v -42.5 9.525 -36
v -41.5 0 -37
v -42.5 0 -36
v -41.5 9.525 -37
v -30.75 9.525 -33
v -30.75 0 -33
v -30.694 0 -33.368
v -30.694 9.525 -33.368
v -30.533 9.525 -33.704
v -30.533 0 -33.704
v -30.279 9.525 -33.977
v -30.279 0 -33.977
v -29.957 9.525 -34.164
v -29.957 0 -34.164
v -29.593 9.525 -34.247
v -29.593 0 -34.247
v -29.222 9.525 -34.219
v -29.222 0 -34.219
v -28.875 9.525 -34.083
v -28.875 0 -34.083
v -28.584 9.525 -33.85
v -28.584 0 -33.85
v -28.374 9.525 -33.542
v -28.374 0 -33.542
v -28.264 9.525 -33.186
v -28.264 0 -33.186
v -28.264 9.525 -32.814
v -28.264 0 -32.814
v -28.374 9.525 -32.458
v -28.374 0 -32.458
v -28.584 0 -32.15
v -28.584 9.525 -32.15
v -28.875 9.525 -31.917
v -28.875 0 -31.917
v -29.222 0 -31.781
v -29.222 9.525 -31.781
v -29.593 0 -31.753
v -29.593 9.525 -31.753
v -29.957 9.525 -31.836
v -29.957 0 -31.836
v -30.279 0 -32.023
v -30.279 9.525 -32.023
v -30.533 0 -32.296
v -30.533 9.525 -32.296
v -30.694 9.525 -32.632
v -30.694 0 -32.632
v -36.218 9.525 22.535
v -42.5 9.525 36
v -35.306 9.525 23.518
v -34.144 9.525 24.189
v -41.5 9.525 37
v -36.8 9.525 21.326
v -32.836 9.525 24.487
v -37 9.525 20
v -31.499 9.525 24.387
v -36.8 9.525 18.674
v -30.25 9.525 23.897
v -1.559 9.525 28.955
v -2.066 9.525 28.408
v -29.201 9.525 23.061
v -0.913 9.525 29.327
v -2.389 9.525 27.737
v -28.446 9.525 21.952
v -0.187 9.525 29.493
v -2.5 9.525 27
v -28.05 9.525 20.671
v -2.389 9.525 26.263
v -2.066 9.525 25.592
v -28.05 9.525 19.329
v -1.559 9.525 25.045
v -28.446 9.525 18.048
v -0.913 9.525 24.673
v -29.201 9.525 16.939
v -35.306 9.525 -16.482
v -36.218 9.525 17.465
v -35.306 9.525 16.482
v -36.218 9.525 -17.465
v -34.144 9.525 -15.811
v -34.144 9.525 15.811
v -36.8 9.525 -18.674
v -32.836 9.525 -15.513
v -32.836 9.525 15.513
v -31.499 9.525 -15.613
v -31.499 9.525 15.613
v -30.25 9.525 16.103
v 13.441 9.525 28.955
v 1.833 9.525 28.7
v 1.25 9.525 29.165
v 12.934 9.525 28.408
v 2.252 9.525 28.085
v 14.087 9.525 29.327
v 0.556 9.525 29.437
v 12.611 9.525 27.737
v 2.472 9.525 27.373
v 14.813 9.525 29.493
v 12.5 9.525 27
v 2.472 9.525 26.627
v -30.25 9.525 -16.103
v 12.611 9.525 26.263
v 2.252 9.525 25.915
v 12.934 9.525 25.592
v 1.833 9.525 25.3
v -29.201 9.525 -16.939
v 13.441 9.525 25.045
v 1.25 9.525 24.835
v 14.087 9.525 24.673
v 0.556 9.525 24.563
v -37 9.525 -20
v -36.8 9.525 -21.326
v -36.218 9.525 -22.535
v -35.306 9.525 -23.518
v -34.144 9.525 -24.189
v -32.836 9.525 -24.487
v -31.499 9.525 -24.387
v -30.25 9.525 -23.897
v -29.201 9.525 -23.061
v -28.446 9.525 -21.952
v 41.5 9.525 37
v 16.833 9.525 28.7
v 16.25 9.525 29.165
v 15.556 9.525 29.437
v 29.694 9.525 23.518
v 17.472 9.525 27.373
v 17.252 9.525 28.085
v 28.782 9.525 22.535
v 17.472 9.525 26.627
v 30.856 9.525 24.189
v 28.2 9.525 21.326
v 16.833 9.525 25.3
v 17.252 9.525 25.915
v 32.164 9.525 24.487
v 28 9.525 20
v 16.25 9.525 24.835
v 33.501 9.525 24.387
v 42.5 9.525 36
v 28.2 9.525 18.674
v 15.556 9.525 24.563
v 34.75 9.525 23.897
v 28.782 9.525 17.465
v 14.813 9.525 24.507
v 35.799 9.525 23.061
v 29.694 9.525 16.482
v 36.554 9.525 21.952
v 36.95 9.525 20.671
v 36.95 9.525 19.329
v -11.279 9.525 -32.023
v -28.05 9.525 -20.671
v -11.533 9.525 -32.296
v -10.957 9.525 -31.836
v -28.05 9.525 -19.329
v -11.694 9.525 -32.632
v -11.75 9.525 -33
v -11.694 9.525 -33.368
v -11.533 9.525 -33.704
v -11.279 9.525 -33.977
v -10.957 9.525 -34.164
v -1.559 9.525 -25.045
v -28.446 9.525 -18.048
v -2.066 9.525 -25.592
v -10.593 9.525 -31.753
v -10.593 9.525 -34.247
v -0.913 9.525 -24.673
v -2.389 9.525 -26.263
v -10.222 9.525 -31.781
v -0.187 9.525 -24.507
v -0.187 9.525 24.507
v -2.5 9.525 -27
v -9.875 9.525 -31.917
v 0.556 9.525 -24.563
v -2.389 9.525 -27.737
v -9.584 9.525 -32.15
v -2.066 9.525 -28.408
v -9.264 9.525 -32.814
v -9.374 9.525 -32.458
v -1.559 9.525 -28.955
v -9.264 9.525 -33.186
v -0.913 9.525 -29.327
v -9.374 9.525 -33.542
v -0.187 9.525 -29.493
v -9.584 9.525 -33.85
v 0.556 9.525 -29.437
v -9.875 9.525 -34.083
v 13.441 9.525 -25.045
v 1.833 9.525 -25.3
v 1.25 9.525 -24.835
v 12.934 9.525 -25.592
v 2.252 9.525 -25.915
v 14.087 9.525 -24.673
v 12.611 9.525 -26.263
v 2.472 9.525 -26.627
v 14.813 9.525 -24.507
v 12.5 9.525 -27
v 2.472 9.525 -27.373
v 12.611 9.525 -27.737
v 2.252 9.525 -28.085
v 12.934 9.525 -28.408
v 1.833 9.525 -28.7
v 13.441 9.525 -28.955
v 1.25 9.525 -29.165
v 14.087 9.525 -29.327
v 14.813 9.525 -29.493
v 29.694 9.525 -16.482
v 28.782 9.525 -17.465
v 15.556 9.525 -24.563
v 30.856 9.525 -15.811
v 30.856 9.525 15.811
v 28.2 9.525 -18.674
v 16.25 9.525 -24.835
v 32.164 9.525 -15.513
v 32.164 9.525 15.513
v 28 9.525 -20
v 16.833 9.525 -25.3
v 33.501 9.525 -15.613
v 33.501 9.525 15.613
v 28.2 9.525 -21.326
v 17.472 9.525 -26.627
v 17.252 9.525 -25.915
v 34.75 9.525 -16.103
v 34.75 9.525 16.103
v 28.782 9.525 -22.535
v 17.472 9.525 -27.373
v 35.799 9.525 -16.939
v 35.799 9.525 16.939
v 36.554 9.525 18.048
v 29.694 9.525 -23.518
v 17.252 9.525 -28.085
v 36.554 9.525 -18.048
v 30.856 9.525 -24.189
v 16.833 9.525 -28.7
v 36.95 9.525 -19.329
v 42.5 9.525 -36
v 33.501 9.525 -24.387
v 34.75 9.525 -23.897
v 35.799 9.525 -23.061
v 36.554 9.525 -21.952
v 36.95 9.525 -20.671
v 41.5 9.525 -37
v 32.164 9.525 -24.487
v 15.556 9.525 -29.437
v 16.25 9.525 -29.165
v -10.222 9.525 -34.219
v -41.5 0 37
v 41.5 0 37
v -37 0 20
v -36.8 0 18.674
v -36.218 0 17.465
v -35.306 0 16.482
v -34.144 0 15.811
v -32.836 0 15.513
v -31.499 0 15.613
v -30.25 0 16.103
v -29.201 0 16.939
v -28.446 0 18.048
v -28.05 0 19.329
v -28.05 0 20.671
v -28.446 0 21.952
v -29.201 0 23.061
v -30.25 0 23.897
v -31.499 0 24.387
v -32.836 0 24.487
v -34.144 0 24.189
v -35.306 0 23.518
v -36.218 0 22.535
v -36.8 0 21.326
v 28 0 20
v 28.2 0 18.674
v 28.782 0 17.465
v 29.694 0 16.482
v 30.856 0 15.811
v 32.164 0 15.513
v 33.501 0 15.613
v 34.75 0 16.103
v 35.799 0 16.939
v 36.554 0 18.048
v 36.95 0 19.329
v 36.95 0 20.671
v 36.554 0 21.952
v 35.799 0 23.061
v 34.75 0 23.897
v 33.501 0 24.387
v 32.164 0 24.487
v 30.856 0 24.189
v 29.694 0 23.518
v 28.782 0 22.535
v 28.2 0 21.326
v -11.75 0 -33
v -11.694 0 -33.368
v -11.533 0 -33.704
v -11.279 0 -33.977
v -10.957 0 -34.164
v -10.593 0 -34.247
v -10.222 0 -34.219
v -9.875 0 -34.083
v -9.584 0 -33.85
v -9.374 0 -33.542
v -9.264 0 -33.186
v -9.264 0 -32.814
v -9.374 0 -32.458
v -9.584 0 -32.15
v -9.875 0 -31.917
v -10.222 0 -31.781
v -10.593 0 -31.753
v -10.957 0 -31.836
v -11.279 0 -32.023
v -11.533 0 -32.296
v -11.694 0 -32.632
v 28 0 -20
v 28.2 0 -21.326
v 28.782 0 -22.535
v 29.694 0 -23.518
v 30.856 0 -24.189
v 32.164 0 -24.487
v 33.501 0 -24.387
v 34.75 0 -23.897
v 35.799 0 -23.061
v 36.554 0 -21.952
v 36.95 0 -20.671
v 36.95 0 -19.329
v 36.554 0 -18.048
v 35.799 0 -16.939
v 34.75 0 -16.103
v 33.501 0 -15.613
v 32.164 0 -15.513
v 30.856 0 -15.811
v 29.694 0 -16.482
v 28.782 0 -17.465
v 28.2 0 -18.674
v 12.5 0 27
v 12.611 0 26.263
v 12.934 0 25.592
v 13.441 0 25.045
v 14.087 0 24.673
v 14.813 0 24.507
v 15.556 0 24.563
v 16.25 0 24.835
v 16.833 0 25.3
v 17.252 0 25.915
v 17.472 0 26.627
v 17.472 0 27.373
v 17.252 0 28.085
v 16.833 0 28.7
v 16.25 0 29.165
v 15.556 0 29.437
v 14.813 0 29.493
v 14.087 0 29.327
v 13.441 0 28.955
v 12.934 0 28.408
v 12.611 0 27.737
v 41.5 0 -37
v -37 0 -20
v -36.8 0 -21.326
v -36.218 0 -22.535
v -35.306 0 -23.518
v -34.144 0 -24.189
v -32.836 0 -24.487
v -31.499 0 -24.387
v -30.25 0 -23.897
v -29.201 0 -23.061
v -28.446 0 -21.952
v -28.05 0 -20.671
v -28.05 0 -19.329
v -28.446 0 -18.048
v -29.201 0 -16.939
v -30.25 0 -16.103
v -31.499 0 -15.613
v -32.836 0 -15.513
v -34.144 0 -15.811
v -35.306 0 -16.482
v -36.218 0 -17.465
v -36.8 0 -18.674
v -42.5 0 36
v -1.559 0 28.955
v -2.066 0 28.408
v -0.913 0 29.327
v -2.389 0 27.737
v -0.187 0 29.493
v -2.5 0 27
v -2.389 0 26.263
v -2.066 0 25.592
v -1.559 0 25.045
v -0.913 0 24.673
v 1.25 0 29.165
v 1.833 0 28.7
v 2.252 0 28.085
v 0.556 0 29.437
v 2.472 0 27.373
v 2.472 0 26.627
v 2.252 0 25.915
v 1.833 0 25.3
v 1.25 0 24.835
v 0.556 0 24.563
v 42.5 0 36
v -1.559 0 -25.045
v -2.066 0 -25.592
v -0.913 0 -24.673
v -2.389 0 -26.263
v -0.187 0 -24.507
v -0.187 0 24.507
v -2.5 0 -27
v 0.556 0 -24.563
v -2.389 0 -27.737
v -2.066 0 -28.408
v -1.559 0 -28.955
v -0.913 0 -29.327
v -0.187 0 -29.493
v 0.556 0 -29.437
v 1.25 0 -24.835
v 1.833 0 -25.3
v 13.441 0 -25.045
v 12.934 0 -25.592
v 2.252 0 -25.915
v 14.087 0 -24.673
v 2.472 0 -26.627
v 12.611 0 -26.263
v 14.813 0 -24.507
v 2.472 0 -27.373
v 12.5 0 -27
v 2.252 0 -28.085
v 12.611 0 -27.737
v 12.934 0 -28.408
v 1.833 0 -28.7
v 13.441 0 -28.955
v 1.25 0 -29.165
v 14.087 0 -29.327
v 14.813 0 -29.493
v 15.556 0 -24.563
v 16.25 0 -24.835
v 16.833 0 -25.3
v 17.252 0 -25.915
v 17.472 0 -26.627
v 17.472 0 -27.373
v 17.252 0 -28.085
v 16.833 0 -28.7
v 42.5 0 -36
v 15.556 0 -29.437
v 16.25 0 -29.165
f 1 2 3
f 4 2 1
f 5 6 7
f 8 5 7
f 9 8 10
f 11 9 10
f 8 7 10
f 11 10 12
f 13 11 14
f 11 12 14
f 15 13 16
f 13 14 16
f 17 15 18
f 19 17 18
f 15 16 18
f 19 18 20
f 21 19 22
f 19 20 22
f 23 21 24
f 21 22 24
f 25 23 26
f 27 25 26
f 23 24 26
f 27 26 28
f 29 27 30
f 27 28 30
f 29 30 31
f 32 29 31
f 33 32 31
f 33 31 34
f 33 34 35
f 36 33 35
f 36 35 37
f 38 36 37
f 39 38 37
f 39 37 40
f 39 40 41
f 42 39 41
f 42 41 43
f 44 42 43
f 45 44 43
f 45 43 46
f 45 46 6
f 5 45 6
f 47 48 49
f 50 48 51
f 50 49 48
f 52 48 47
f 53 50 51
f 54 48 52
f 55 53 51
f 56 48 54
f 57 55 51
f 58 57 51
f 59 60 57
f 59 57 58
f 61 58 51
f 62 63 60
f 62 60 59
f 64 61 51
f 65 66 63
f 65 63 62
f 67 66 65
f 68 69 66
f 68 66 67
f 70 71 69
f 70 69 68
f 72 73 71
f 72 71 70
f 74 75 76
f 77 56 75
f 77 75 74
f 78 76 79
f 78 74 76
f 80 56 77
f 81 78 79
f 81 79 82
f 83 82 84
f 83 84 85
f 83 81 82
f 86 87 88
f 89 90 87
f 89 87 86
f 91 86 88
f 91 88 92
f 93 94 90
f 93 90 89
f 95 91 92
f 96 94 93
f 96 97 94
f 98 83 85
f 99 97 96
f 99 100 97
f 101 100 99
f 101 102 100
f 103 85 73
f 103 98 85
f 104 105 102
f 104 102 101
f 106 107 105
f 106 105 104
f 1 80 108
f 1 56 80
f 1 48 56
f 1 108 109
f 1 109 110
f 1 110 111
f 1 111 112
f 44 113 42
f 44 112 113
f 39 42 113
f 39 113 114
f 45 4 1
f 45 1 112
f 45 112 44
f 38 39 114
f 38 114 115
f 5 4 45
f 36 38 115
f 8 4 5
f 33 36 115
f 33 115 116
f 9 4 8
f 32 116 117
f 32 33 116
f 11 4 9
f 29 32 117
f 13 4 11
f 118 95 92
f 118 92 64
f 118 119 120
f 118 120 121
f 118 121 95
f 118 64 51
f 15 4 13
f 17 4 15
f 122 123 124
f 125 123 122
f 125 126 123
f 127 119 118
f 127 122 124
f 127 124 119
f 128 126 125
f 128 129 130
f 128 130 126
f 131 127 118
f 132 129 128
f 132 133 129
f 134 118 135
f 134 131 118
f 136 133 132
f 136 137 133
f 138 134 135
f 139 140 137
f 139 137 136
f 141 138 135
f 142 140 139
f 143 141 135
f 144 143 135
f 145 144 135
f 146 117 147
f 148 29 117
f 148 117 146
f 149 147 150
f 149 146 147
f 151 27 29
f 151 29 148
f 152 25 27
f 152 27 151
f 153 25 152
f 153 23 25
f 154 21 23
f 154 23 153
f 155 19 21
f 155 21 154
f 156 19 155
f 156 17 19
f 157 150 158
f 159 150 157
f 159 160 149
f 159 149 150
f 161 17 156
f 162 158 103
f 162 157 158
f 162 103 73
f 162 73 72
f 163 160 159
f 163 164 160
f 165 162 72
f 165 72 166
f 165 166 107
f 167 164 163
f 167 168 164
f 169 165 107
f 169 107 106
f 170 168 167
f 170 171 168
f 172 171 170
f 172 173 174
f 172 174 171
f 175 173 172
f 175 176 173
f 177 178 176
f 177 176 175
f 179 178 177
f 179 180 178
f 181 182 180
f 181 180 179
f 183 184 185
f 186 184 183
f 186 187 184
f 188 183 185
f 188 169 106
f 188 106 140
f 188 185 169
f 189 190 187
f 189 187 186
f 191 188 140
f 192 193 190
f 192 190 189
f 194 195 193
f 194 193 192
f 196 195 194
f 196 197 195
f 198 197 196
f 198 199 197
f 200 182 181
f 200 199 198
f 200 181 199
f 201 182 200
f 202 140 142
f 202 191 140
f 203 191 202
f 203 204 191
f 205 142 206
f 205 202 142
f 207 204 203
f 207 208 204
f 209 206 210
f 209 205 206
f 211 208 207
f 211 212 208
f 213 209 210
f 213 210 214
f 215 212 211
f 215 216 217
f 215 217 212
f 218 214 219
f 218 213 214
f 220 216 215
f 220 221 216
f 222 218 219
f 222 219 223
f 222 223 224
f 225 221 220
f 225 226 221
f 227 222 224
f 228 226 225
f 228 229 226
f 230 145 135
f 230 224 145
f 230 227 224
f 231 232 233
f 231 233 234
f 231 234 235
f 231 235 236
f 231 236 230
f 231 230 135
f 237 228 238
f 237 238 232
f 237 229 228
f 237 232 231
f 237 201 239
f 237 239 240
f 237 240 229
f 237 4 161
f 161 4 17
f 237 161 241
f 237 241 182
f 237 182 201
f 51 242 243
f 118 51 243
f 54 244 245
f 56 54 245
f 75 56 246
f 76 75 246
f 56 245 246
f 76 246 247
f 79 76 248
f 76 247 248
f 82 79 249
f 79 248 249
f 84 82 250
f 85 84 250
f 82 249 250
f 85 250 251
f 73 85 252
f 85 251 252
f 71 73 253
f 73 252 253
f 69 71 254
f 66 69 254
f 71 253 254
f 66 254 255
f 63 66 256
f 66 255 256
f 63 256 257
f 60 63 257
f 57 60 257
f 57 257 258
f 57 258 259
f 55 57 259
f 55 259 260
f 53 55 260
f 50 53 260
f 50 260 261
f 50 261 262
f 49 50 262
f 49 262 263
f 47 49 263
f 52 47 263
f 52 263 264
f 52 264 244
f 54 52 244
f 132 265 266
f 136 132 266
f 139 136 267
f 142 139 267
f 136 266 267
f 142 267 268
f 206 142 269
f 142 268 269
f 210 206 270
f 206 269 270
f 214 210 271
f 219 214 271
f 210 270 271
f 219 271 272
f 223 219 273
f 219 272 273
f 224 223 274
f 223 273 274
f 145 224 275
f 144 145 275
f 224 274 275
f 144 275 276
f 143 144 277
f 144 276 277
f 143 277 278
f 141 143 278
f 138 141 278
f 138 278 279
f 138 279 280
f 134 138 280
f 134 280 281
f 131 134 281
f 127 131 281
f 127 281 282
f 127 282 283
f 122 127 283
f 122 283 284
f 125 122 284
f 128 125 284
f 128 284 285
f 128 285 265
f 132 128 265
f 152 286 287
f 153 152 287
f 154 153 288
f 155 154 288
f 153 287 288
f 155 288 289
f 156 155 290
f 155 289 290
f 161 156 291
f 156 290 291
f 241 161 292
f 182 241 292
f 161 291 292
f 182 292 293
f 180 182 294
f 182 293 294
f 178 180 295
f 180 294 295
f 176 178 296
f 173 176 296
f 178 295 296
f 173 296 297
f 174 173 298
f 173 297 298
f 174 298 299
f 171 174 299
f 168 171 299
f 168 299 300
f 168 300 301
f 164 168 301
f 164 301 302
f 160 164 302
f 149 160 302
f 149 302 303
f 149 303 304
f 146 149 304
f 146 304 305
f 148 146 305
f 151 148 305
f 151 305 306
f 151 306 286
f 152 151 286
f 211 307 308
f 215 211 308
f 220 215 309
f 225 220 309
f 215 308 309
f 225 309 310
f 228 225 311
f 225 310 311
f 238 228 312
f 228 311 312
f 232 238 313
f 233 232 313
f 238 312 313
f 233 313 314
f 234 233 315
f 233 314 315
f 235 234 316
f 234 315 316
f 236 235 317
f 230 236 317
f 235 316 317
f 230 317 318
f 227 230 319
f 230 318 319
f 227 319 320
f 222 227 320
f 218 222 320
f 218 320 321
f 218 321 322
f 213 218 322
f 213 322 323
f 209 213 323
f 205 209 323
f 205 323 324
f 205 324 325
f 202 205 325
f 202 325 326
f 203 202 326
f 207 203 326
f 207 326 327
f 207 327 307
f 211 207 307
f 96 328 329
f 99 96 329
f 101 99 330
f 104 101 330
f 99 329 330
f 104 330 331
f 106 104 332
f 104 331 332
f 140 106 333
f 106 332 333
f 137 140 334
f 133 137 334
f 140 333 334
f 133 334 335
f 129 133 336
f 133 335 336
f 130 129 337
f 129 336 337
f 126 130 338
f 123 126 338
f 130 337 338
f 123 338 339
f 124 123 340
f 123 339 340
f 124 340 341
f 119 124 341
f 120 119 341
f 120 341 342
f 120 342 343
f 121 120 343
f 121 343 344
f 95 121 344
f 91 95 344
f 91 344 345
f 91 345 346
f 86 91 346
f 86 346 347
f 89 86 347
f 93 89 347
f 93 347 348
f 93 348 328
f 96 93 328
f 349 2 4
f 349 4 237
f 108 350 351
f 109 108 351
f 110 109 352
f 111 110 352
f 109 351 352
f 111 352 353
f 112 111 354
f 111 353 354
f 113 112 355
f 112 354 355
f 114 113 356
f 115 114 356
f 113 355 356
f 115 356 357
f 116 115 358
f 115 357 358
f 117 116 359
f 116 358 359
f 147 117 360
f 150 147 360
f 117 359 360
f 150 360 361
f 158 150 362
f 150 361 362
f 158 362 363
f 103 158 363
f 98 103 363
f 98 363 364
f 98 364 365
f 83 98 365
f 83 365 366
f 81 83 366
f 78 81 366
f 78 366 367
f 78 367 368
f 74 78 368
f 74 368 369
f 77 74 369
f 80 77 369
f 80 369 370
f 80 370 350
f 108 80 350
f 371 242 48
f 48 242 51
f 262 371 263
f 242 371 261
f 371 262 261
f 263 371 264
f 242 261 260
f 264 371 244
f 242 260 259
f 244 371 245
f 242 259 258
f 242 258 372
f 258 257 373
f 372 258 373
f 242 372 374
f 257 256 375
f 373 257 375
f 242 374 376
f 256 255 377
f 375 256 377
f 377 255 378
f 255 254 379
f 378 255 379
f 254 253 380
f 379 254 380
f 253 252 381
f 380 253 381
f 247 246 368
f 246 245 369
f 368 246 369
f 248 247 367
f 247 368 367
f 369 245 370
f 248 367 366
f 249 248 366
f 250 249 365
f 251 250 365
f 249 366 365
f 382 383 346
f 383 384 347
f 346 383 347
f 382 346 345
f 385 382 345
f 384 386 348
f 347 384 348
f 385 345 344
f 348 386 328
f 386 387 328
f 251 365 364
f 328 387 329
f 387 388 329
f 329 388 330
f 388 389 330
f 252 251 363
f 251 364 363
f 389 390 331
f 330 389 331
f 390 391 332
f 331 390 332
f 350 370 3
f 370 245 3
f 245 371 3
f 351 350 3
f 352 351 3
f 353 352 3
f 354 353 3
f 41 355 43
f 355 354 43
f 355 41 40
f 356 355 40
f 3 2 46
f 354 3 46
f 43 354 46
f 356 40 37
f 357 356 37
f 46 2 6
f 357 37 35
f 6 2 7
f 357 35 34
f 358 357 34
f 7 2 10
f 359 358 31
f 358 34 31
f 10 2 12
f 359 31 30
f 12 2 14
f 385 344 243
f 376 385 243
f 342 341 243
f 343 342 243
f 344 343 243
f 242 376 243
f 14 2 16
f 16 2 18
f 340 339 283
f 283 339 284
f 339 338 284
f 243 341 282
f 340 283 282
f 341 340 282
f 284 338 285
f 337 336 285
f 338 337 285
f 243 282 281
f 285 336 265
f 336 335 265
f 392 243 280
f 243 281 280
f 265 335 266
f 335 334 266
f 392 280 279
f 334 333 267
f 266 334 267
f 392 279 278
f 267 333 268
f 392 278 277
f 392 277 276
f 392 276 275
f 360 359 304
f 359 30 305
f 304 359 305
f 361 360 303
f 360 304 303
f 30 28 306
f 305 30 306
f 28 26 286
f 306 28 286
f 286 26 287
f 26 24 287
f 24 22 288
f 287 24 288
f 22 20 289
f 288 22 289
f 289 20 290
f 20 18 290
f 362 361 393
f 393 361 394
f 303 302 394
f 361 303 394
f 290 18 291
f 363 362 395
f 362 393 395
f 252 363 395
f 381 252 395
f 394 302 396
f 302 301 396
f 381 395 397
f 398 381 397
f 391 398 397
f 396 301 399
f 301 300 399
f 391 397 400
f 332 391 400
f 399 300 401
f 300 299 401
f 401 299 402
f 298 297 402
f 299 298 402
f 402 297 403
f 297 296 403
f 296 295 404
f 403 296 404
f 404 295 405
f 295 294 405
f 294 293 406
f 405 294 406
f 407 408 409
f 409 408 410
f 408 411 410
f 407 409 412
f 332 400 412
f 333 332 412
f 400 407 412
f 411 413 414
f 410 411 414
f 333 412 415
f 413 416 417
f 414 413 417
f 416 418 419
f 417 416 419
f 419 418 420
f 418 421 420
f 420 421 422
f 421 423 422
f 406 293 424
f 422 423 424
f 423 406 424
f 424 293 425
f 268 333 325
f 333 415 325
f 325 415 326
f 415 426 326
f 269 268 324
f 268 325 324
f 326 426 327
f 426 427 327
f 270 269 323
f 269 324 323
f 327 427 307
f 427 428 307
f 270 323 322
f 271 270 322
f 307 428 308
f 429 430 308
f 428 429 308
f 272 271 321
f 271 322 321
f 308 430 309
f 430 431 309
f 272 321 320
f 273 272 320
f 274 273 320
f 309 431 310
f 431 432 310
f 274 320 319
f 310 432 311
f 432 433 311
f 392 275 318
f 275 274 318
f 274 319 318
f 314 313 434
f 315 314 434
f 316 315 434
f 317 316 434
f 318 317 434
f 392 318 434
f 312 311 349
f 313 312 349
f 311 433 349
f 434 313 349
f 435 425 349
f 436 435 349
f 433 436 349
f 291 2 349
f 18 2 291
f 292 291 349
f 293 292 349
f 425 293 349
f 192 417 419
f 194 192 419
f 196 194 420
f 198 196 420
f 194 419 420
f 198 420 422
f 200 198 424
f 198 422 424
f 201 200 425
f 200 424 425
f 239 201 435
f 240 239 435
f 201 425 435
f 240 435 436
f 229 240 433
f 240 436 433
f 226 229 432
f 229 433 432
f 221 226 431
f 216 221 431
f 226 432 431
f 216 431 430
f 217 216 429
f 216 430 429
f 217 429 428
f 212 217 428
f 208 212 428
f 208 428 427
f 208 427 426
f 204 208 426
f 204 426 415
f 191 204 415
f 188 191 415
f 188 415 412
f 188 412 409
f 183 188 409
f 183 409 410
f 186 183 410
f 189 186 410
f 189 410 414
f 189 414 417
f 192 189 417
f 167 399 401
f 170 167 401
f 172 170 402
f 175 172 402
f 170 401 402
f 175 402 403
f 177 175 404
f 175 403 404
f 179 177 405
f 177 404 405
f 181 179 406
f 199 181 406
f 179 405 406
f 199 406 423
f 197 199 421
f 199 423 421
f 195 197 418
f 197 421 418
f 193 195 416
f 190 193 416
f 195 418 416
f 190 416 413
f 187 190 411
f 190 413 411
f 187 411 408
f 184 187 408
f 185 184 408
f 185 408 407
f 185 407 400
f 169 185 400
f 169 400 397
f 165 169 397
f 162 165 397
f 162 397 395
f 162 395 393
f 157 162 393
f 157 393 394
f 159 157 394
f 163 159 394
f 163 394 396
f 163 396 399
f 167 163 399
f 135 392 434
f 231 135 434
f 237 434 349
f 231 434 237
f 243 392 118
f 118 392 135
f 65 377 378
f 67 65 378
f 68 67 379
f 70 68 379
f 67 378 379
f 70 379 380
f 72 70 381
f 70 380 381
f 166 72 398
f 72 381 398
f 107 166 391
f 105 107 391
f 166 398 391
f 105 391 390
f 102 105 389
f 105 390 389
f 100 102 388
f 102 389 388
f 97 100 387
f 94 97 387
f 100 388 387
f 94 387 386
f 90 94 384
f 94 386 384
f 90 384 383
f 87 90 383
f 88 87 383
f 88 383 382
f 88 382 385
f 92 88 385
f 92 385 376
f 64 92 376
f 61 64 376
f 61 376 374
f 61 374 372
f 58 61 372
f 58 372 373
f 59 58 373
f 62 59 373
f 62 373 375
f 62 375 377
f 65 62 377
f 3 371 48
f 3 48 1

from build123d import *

# Parameters (mm, degrees)
SKETCH1_W             = 85
SKETCH1_H             = 74
BOSS_EXTRUDE1_DEPTH   = 9.525
M8_CLEARANCE_HOLE1_D  = 9
M6X1_0_TAPPED_HOLE1_D = 5
M3X0_5_TAPPED_HOLE1_D = 2.5
CHAMFER1_SIZE         = 1


with BuildPart() as part:
    # Sketch1 → Boss-Extrude1 (new body)
    with BuildSketch(Plane(origin=(0, 0, 0), x_dir=(1, 0, 0), z_dir=(0, 1, 0))):
        Rectangle(SKETCH1_W, SKETCH1_H)
    extrude(amount=BOSS_EXTRUDE1_DEPTH)

    # M8 Clearance Hole1 (through all)
    with Locations(Plane(origin=(0, 9.525, 0), x_dir=(1, 0, 0), z_dir=(0, 1, 0))):
        with Locations((-32.5, 20), (32.5, 20), (32.5, -20), (-32.5, -20)):
            Hole(M8_CLEARANCE_HOLE1_D / 2)

    # M6x1.0 Tapped Hole1 (through all)
    with Locations(Plane(origin=(0, 9.525, 0), x_dir=(1, 0, 0), z_dir=(0, 1, 0))):
        with Locations((0, 27), (15, 27), (15, -27), (0, -27)):
            Hole(M6X1_0_TAPPED_HOLE1_D / 2)

    # M3x0.5 Tapped Hole1 (through all)
    with Locations(Plane(origin=(0, 9.525, 0), x_dir=(1, 0, 0), z_dir=(0, 1, 0))):
        with Locations((-29.5, 33), (-10.5, 33)):
            Hole(M3X0_5_TAPPED_HOLE1_D / 2)

    # Chamfer1
    chamfer1_edges = [part.edges().sort_by_distance(p)[0] for p in [
        (42.5, 4.7625, 37),
        (-42.5, 4.7625, 37),
        (-42.5, 4.7625, -37),
        (42.5, 4.7625, -37),
    ]]
    chamfer(chamfer1_edges, length=CHAMFER1_SIZE)


solid = part.part
